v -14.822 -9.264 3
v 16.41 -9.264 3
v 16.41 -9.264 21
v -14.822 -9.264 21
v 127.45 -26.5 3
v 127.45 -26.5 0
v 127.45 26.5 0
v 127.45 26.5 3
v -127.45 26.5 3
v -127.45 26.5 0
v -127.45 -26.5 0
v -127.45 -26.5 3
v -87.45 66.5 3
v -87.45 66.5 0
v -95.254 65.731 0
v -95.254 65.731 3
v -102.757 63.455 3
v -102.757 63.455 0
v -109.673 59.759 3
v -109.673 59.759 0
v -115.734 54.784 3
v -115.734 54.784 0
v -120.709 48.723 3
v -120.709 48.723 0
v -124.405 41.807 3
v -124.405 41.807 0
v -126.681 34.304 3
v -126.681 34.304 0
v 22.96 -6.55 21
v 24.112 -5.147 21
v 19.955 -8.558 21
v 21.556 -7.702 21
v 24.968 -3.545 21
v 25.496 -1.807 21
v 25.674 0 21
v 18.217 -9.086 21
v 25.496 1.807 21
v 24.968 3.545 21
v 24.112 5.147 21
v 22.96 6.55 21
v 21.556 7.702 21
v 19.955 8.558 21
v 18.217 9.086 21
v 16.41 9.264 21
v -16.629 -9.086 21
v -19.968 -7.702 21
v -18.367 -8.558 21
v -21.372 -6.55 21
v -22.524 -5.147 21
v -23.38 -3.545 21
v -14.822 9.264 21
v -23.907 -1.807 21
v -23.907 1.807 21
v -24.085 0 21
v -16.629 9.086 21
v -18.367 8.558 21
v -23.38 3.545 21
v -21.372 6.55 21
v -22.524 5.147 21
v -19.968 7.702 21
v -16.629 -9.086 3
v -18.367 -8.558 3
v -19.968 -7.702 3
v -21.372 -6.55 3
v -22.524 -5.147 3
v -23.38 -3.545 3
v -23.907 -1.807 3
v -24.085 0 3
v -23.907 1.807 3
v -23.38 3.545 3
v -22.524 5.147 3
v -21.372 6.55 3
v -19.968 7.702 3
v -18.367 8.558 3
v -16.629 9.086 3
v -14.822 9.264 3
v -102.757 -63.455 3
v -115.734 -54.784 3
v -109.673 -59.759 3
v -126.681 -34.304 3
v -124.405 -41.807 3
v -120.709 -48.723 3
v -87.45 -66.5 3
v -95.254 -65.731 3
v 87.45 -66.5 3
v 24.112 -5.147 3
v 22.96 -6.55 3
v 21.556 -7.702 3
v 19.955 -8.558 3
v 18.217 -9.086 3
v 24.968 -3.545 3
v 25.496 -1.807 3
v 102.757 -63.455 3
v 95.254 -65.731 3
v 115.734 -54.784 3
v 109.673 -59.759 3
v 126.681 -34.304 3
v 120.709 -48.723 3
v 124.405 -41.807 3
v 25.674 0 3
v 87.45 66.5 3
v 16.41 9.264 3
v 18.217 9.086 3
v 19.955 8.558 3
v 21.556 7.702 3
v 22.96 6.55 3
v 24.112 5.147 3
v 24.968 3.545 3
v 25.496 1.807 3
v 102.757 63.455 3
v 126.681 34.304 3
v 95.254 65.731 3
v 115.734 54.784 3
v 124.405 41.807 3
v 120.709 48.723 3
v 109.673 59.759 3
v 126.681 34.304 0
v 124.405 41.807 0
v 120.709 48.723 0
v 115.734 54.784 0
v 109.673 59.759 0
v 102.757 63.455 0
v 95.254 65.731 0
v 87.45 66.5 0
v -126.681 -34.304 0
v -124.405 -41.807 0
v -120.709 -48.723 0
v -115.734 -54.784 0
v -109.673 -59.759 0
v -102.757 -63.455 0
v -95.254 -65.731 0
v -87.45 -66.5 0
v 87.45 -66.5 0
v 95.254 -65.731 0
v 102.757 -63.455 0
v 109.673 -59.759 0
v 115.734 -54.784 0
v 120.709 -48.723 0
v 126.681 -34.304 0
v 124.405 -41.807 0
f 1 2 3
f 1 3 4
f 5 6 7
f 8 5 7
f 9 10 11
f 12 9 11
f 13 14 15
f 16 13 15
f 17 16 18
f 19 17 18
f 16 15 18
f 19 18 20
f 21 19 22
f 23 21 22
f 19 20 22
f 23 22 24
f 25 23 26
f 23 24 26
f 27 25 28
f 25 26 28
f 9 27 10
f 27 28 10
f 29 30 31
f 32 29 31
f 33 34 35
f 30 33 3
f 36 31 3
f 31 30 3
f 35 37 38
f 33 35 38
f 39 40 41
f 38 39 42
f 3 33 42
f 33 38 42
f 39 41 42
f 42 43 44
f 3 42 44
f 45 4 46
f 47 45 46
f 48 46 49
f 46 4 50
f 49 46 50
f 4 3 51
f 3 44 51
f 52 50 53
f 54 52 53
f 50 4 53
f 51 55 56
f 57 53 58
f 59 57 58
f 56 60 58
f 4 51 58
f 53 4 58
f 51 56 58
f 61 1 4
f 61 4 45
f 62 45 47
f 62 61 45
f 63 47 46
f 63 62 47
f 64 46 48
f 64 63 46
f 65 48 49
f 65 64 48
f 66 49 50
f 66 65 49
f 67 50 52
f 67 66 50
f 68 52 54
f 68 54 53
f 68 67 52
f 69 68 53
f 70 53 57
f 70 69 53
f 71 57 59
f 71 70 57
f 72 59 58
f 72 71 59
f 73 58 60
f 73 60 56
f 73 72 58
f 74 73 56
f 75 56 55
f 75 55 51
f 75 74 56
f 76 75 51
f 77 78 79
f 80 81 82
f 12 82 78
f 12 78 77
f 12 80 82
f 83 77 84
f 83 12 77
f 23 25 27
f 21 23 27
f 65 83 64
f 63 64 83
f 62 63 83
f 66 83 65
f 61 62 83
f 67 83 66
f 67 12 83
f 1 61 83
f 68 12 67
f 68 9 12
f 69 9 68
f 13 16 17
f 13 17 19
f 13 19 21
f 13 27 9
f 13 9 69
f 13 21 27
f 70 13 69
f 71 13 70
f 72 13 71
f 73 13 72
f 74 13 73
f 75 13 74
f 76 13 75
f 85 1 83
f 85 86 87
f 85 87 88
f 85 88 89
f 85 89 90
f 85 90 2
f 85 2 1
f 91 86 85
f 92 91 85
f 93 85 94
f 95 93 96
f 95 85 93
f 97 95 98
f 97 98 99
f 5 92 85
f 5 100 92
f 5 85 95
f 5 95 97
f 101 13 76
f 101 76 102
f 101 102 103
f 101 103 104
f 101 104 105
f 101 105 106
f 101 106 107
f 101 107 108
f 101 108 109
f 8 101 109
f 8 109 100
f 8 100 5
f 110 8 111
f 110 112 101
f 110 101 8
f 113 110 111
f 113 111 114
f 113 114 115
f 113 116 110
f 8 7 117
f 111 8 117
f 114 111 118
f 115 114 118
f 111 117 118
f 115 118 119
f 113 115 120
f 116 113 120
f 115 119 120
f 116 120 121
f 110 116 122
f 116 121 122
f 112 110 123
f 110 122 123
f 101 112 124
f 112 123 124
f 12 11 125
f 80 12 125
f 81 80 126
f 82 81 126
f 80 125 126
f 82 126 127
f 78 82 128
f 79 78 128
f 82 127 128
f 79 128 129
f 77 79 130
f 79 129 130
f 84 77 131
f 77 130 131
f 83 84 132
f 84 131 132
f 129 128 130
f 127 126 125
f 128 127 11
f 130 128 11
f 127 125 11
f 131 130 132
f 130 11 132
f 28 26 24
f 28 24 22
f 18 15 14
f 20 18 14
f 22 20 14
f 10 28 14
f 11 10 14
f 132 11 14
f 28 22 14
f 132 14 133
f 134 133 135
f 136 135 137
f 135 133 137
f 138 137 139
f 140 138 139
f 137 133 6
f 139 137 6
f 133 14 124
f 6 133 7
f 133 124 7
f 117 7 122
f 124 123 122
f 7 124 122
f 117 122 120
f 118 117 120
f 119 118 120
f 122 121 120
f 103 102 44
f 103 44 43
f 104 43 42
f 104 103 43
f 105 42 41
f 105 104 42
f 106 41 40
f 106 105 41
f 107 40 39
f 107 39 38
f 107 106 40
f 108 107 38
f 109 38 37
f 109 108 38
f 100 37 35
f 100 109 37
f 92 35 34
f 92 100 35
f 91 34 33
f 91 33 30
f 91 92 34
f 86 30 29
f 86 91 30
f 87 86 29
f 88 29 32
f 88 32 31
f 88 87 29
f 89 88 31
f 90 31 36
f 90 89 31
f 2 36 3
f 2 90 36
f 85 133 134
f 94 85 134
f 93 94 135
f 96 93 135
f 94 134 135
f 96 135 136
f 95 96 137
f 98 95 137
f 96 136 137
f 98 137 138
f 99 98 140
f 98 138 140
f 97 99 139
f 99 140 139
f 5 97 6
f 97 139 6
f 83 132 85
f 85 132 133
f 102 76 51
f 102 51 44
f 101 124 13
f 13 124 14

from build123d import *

# Parameters (mm, degrees)
EXTRUDE_1_DEPTH = 3
EXTRUDE_2_DEPTH = 18


with BuildPart() as part:
    # 草图1 → 凸台-拉伸1 (new body)
    with BuildSketch(Plane.XY):
        with BuildLine():
            Line((87.45, 66.5), (-87.45, 66.5))
            ThreePointArc((-87.45, 66.5), (-115.734271247, 54.784271247), (-127.45, 26.5))
            Line((-127.45, 26.5), (-127.45, -26.5))
            ThreePointArc((-127.45, -26.5), (-115.734271247, -54.784271247), (-87.45, -66.5))
            Line((-87.45, -66.5), (87.45, -66.5))
            ThreePointArc((87.45, -66.5), (115.734271247, -54.784271247), (127.45, -26.5))
            Line((127.45, -26.5), (127.45, 26.5))
            ThreePointArc((127.45, 26.5), (115.734271247, 54.784271247), (87.45, 66.5))
        make_face()
    extrude(amount=EXTRUDE_1_DEPTH)

    # 草图2 → 凸台-拉伸2 (add)
    with BuildSketch(Plane.XY.offset(3)):
        with BuildLine():
            Line((-14.821826733, 9.263641708), (16.409879597, 9.263641708))
            ThreePointArc((16.409879597, 9.263641708), (25.673521305, 0), (16.409879597, -9.263641708))
            Line((16.409879597, -9.263641708), (-14.821826733, -9.263641708))
            ThreePointArc((-14.821826733, -9.263641708), (-24.085468441, 0), (-14.821826733, 9.263641708))
        make_face()
    extrude(amount=EXTRUDE_2_DEPTH)


solid = part.part
